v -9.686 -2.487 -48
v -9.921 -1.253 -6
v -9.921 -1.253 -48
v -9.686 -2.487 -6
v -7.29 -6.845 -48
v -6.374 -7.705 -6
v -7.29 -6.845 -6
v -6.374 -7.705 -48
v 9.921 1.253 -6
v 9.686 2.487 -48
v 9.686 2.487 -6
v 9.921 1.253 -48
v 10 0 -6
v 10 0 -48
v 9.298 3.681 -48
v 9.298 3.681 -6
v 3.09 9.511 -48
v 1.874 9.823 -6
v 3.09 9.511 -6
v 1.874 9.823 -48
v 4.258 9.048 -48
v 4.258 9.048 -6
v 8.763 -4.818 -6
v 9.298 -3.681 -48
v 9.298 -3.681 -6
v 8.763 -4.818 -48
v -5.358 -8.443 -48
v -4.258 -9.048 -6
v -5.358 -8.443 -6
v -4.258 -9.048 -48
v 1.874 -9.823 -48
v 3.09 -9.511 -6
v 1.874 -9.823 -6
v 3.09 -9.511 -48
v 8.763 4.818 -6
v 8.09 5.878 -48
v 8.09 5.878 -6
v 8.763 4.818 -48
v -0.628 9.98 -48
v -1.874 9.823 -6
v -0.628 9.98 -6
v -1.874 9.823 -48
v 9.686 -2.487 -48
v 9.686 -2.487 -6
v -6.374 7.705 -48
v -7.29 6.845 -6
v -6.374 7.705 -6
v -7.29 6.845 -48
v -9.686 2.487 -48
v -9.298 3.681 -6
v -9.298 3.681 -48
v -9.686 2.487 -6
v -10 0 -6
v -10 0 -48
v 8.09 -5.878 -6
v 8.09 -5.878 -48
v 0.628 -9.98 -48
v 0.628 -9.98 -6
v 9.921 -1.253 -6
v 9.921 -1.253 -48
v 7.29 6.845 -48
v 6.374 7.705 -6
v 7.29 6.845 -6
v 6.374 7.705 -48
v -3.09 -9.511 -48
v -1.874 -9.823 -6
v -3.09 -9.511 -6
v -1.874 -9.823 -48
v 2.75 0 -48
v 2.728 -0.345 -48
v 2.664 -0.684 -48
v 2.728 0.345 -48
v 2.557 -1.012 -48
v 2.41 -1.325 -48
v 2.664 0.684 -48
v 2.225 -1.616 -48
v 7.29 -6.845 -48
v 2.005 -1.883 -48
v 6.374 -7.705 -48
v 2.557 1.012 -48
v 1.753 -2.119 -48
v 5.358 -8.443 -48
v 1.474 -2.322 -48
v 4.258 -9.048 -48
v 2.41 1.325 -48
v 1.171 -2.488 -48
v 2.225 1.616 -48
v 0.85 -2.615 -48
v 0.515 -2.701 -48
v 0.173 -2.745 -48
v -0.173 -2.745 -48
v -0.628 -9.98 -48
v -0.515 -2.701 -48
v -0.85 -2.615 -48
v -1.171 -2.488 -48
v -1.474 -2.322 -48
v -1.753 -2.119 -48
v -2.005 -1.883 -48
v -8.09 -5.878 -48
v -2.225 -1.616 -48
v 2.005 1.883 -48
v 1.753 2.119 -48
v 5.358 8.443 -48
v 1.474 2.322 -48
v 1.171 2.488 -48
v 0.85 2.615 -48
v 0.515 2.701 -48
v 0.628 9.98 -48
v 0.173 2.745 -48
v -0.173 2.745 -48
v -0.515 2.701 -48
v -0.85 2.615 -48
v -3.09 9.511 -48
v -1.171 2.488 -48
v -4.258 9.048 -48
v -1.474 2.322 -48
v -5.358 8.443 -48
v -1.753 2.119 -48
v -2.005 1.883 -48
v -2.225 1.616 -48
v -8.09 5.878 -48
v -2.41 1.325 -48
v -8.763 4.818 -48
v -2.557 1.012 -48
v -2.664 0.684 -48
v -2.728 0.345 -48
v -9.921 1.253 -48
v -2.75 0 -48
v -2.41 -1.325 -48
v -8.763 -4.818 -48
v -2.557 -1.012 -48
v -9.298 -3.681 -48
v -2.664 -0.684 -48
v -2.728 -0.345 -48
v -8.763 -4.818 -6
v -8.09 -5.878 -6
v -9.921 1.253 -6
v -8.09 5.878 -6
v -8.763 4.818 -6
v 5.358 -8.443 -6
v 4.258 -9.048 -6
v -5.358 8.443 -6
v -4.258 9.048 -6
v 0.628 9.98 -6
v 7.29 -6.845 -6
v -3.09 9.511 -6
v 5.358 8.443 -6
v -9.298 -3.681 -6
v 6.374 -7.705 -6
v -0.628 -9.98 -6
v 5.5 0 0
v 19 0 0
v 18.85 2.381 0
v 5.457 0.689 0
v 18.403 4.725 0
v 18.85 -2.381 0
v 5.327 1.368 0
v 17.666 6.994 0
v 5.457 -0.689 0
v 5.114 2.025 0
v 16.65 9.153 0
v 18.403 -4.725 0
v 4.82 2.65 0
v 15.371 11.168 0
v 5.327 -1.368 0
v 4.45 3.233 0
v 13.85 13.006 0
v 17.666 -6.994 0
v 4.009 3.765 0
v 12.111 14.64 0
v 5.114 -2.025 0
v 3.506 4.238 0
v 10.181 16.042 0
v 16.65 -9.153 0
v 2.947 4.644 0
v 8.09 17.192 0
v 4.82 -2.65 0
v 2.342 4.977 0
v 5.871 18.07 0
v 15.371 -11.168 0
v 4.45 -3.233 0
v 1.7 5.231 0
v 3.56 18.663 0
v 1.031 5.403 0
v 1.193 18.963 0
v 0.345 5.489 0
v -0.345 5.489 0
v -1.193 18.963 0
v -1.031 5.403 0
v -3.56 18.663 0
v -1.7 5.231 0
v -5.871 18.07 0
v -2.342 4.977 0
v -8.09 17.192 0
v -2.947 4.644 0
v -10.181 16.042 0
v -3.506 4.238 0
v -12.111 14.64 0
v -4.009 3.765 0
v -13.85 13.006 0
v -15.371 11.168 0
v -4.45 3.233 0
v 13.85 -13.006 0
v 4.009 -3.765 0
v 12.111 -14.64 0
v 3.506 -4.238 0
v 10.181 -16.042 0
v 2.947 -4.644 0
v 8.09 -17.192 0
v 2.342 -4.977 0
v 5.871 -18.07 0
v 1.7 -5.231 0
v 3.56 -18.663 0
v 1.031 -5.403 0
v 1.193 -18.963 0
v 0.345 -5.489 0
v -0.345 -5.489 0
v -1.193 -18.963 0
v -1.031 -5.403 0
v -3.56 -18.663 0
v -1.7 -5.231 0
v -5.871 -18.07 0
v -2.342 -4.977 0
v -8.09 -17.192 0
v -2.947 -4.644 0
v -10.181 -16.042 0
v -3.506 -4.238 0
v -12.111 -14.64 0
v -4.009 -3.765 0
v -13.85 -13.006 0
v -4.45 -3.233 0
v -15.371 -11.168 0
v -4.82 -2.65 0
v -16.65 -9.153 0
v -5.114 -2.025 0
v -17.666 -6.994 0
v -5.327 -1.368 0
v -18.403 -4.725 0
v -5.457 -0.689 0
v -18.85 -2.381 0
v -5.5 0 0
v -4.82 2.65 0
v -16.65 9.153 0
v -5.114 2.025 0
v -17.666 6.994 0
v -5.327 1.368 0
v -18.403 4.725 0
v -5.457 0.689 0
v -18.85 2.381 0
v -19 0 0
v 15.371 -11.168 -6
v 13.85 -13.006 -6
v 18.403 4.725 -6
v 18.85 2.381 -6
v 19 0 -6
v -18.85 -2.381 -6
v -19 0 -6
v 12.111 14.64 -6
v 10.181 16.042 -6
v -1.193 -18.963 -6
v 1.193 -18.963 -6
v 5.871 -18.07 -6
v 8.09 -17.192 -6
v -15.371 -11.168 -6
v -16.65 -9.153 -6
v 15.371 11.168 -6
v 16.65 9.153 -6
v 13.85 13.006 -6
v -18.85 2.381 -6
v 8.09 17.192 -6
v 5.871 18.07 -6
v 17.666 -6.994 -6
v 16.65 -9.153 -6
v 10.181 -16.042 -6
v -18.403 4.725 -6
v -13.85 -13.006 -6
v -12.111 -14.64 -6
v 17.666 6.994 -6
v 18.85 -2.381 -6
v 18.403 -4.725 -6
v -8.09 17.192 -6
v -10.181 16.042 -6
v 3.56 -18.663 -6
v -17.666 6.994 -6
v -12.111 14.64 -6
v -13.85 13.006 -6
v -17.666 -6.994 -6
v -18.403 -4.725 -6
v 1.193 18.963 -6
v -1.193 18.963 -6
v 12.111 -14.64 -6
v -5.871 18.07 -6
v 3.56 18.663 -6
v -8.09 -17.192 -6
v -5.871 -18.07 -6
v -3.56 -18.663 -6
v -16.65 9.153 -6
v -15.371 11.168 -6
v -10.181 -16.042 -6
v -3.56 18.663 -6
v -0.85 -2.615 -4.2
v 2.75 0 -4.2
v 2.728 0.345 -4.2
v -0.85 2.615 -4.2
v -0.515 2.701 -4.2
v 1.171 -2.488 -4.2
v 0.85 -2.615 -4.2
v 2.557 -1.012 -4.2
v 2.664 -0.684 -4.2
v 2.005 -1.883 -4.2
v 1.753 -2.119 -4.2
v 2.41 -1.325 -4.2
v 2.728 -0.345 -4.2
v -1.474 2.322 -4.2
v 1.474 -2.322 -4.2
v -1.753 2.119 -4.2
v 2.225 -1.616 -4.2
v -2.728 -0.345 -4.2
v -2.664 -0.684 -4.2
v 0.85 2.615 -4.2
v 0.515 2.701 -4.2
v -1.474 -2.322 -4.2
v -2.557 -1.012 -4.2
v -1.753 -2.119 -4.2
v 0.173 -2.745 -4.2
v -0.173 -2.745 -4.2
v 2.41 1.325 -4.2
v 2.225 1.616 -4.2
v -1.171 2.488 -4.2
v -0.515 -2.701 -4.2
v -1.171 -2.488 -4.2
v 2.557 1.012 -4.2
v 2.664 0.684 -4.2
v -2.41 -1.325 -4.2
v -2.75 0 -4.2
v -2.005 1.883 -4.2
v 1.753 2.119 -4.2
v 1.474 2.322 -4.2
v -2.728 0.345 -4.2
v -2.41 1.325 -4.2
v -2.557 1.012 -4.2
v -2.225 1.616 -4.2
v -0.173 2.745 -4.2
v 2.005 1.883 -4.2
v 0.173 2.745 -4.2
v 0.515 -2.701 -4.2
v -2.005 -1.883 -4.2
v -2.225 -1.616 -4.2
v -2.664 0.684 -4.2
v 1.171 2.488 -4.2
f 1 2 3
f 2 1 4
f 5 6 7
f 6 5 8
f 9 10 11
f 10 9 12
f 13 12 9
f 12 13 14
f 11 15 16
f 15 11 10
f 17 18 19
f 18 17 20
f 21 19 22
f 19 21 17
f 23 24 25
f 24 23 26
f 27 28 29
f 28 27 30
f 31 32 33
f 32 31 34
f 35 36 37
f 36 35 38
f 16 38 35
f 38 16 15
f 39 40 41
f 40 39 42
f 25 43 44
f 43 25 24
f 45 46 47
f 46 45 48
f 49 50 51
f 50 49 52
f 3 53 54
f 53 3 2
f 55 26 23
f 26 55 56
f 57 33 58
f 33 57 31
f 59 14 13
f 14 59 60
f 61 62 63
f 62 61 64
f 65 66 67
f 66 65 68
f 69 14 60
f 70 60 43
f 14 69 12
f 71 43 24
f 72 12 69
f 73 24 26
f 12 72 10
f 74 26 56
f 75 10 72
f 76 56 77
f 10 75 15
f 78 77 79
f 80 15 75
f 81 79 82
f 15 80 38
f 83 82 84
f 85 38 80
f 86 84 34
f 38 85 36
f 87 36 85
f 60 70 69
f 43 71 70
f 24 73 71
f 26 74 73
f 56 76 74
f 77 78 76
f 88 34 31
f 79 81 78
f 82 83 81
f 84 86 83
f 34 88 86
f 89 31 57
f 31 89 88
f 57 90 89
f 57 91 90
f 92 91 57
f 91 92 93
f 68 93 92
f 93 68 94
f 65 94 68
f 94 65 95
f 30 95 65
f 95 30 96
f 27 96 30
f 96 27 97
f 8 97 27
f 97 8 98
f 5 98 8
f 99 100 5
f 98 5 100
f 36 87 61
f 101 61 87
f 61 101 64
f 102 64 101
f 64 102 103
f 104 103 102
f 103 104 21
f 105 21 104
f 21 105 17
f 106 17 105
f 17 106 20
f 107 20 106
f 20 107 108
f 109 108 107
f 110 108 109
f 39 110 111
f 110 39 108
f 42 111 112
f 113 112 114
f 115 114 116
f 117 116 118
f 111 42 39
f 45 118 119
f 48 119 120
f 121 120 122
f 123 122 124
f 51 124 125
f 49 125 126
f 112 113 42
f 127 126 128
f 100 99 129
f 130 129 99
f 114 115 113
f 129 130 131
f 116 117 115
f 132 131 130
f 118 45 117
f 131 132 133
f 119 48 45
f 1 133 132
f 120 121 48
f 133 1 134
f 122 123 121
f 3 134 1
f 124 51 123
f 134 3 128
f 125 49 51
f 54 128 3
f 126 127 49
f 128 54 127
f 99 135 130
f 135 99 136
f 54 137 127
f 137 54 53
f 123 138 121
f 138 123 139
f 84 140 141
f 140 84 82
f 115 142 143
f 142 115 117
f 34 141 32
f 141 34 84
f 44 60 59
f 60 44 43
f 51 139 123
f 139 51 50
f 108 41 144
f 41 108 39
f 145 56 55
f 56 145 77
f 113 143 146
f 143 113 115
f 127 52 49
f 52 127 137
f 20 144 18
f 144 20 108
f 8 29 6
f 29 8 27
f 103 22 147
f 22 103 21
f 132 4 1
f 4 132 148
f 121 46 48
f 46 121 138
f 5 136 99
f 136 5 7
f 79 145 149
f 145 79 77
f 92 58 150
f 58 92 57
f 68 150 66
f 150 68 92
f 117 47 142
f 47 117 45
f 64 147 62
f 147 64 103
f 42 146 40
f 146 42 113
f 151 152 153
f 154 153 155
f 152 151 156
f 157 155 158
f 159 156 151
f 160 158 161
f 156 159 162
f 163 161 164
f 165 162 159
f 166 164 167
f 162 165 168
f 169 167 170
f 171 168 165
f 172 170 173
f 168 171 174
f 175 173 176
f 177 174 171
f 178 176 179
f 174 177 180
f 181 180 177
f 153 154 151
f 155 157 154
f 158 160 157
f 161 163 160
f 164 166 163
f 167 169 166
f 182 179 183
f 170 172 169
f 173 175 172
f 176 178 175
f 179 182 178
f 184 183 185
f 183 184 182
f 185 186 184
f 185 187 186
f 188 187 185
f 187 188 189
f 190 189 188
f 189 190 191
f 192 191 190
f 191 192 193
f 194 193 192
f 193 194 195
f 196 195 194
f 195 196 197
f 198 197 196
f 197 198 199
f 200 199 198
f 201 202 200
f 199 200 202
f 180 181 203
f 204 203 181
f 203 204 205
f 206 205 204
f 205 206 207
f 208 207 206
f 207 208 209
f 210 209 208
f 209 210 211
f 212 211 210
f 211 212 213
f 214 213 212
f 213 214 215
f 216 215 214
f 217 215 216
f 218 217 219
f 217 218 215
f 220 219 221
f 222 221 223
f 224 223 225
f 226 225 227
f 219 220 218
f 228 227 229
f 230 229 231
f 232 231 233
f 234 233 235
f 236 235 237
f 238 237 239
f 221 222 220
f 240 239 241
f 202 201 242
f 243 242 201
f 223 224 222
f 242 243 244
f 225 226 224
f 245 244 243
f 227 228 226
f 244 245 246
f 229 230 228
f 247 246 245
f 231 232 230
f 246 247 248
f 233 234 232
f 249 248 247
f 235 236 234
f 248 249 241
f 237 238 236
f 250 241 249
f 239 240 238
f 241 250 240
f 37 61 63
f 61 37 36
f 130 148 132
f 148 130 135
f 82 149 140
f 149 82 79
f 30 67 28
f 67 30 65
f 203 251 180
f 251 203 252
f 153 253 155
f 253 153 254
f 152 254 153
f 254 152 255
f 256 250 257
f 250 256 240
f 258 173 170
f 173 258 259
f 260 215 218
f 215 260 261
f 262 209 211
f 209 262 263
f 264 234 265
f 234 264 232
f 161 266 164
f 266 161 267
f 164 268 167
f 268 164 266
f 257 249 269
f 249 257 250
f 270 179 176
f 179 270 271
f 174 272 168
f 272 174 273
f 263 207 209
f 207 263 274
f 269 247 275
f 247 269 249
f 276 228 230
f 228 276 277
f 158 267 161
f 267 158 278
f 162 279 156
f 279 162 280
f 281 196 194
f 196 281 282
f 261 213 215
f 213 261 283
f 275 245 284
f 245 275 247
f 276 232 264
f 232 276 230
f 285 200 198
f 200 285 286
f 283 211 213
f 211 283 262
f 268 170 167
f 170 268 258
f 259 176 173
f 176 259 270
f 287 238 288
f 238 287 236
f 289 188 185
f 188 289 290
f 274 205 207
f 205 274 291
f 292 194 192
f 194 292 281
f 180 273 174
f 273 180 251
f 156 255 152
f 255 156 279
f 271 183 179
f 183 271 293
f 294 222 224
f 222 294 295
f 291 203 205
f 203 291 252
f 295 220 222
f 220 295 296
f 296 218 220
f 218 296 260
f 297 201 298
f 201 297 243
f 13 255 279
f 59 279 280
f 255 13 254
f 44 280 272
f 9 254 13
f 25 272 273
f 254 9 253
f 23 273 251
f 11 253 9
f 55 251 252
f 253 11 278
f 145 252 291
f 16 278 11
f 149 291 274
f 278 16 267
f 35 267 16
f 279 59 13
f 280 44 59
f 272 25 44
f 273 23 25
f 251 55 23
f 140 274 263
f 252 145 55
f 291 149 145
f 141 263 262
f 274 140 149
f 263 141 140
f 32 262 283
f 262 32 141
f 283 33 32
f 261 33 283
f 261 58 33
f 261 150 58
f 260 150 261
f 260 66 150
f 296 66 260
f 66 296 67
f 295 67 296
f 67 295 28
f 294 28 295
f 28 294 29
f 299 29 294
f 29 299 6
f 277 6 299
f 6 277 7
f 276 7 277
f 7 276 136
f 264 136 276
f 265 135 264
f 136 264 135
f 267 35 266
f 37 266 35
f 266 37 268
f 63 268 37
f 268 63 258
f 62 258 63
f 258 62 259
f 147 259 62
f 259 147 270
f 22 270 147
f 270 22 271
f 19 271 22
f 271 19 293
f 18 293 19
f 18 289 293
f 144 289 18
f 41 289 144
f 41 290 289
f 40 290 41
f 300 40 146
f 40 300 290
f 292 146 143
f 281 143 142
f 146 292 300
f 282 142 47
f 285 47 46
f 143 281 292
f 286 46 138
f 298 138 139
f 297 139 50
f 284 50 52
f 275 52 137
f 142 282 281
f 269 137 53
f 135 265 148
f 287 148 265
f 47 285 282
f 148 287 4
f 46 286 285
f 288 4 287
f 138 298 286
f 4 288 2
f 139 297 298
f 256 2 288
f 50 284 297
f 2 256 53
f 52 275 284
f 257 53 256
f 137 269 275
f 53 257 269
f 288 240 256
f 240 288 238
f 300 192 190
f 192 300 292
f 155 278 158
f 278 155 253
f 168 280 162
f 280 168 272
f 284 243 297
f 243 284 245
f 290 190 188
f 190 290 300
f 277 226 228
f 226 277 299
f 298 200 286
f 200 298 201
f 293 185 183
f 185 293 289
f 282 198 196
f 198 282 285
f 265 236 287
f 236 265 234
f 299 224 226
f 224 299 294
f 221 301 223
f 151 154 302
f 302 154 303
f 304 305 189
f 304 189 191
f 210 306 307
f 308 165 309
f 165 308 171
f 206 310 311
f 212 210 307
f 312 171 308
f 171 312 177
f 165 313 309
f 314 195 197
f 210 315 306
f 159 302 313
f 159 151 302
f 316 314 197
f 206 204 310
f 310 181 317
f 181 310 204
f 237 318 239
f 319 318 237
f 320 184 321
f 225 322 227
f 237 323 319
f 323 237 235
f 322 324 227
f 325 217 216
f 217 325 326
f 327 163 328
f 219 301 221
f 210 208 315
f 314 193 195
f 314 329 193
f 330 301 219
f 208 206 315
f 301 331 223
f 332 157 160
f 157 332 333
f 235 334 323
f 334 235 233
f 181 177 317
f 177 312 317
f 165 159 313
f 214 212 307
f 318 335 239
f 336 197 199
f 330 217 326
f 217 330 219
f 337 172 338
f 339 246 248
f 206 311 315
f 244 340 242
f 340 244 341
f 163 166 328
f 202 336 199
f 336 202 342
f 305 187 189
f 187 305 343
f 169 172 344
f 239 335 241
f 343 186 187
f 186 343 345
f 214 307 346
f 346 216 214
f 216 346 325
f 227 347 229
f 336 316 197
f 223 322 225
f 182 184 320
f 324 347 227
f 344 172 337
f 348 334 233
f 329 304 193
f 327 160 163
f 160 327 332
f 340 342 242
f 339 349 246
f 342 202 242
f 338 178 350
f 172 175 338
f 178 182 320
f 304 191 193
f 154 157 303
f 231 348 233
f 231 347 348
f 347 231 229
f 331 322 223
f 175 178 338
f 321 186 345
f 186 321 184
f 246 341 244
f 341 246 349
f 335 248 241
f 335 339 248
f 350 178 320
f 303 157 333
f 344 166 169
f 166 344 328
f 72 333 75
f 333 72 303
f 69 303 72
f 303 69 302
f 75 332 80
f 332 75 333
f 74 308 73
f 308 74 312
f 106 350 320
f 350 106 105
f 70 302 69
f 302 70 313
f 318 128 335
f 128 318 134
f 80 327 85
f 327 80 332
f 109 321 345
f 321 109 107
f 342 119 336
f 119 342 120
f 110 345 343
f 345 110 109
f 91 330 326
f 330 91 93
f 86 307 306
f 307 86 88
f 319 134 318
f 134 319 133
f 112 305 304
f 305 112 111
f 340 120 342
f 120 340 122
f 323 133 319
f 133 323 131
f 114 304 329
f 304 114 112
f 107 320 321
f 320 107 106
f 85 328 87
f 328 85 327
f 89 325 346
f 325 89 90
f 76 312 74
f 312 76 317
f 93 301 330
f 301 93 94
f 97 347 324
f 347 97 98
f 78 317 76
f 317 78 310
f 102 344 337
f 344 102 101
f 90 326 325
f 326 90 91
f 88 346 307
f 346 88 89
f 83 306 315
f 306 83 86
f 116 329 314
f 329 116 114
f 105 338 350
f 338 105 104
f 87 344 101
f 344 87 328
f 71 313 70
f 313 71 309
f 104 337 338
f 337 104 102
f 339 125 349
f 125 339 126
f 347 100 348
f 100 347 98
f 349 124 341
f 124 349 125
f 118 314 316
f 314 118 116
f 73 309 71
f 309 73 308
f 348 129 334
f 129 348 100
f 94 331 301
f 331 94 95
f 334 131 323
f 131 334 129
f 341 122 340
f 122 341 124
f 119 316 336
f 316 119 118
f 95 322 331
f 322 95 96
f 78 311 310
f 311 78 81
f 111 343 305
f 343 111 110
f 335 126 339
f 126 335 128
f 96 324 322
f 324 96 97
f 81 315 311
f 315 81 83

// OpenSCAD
$fn = 50;


difference() {
	union() {
		translate(v = [0, 0, -48.0000000000]) {
			cylinder(h = 48, r = 10.0000000000);
		}
		translate(v = [0, 0, -6.0000000000]) {
			cylinder(h = 6, r = 19.0000000000);
		}
	}
	union() {
		translate(v = [0, 0, 0]) {
			rotate(a = [0, 0, 0]) {
				difference() {
					union() {
						#translate(v = [0, 0, -48.0000000000]) {
							cylinder(h = 48, r = 2.2500000000);
						}
						#translate(v = [0, 0, -4.2000000000]) {
							cylinder(h = 4.2000000000, r1 = 2.7500000000, r2 = 5.5000000000);
						}
						#translate(v = [0, 0, -48.0000000000]) {
							cylinder(h = 48, r = 2.7500000000);
						}
						#translate(v = [0, 0, -48.0000000000]) {
							cylinder(h = 48, r = 2.2500000000);
						}
					}
					union();
				}
			}
		}
	}
}
